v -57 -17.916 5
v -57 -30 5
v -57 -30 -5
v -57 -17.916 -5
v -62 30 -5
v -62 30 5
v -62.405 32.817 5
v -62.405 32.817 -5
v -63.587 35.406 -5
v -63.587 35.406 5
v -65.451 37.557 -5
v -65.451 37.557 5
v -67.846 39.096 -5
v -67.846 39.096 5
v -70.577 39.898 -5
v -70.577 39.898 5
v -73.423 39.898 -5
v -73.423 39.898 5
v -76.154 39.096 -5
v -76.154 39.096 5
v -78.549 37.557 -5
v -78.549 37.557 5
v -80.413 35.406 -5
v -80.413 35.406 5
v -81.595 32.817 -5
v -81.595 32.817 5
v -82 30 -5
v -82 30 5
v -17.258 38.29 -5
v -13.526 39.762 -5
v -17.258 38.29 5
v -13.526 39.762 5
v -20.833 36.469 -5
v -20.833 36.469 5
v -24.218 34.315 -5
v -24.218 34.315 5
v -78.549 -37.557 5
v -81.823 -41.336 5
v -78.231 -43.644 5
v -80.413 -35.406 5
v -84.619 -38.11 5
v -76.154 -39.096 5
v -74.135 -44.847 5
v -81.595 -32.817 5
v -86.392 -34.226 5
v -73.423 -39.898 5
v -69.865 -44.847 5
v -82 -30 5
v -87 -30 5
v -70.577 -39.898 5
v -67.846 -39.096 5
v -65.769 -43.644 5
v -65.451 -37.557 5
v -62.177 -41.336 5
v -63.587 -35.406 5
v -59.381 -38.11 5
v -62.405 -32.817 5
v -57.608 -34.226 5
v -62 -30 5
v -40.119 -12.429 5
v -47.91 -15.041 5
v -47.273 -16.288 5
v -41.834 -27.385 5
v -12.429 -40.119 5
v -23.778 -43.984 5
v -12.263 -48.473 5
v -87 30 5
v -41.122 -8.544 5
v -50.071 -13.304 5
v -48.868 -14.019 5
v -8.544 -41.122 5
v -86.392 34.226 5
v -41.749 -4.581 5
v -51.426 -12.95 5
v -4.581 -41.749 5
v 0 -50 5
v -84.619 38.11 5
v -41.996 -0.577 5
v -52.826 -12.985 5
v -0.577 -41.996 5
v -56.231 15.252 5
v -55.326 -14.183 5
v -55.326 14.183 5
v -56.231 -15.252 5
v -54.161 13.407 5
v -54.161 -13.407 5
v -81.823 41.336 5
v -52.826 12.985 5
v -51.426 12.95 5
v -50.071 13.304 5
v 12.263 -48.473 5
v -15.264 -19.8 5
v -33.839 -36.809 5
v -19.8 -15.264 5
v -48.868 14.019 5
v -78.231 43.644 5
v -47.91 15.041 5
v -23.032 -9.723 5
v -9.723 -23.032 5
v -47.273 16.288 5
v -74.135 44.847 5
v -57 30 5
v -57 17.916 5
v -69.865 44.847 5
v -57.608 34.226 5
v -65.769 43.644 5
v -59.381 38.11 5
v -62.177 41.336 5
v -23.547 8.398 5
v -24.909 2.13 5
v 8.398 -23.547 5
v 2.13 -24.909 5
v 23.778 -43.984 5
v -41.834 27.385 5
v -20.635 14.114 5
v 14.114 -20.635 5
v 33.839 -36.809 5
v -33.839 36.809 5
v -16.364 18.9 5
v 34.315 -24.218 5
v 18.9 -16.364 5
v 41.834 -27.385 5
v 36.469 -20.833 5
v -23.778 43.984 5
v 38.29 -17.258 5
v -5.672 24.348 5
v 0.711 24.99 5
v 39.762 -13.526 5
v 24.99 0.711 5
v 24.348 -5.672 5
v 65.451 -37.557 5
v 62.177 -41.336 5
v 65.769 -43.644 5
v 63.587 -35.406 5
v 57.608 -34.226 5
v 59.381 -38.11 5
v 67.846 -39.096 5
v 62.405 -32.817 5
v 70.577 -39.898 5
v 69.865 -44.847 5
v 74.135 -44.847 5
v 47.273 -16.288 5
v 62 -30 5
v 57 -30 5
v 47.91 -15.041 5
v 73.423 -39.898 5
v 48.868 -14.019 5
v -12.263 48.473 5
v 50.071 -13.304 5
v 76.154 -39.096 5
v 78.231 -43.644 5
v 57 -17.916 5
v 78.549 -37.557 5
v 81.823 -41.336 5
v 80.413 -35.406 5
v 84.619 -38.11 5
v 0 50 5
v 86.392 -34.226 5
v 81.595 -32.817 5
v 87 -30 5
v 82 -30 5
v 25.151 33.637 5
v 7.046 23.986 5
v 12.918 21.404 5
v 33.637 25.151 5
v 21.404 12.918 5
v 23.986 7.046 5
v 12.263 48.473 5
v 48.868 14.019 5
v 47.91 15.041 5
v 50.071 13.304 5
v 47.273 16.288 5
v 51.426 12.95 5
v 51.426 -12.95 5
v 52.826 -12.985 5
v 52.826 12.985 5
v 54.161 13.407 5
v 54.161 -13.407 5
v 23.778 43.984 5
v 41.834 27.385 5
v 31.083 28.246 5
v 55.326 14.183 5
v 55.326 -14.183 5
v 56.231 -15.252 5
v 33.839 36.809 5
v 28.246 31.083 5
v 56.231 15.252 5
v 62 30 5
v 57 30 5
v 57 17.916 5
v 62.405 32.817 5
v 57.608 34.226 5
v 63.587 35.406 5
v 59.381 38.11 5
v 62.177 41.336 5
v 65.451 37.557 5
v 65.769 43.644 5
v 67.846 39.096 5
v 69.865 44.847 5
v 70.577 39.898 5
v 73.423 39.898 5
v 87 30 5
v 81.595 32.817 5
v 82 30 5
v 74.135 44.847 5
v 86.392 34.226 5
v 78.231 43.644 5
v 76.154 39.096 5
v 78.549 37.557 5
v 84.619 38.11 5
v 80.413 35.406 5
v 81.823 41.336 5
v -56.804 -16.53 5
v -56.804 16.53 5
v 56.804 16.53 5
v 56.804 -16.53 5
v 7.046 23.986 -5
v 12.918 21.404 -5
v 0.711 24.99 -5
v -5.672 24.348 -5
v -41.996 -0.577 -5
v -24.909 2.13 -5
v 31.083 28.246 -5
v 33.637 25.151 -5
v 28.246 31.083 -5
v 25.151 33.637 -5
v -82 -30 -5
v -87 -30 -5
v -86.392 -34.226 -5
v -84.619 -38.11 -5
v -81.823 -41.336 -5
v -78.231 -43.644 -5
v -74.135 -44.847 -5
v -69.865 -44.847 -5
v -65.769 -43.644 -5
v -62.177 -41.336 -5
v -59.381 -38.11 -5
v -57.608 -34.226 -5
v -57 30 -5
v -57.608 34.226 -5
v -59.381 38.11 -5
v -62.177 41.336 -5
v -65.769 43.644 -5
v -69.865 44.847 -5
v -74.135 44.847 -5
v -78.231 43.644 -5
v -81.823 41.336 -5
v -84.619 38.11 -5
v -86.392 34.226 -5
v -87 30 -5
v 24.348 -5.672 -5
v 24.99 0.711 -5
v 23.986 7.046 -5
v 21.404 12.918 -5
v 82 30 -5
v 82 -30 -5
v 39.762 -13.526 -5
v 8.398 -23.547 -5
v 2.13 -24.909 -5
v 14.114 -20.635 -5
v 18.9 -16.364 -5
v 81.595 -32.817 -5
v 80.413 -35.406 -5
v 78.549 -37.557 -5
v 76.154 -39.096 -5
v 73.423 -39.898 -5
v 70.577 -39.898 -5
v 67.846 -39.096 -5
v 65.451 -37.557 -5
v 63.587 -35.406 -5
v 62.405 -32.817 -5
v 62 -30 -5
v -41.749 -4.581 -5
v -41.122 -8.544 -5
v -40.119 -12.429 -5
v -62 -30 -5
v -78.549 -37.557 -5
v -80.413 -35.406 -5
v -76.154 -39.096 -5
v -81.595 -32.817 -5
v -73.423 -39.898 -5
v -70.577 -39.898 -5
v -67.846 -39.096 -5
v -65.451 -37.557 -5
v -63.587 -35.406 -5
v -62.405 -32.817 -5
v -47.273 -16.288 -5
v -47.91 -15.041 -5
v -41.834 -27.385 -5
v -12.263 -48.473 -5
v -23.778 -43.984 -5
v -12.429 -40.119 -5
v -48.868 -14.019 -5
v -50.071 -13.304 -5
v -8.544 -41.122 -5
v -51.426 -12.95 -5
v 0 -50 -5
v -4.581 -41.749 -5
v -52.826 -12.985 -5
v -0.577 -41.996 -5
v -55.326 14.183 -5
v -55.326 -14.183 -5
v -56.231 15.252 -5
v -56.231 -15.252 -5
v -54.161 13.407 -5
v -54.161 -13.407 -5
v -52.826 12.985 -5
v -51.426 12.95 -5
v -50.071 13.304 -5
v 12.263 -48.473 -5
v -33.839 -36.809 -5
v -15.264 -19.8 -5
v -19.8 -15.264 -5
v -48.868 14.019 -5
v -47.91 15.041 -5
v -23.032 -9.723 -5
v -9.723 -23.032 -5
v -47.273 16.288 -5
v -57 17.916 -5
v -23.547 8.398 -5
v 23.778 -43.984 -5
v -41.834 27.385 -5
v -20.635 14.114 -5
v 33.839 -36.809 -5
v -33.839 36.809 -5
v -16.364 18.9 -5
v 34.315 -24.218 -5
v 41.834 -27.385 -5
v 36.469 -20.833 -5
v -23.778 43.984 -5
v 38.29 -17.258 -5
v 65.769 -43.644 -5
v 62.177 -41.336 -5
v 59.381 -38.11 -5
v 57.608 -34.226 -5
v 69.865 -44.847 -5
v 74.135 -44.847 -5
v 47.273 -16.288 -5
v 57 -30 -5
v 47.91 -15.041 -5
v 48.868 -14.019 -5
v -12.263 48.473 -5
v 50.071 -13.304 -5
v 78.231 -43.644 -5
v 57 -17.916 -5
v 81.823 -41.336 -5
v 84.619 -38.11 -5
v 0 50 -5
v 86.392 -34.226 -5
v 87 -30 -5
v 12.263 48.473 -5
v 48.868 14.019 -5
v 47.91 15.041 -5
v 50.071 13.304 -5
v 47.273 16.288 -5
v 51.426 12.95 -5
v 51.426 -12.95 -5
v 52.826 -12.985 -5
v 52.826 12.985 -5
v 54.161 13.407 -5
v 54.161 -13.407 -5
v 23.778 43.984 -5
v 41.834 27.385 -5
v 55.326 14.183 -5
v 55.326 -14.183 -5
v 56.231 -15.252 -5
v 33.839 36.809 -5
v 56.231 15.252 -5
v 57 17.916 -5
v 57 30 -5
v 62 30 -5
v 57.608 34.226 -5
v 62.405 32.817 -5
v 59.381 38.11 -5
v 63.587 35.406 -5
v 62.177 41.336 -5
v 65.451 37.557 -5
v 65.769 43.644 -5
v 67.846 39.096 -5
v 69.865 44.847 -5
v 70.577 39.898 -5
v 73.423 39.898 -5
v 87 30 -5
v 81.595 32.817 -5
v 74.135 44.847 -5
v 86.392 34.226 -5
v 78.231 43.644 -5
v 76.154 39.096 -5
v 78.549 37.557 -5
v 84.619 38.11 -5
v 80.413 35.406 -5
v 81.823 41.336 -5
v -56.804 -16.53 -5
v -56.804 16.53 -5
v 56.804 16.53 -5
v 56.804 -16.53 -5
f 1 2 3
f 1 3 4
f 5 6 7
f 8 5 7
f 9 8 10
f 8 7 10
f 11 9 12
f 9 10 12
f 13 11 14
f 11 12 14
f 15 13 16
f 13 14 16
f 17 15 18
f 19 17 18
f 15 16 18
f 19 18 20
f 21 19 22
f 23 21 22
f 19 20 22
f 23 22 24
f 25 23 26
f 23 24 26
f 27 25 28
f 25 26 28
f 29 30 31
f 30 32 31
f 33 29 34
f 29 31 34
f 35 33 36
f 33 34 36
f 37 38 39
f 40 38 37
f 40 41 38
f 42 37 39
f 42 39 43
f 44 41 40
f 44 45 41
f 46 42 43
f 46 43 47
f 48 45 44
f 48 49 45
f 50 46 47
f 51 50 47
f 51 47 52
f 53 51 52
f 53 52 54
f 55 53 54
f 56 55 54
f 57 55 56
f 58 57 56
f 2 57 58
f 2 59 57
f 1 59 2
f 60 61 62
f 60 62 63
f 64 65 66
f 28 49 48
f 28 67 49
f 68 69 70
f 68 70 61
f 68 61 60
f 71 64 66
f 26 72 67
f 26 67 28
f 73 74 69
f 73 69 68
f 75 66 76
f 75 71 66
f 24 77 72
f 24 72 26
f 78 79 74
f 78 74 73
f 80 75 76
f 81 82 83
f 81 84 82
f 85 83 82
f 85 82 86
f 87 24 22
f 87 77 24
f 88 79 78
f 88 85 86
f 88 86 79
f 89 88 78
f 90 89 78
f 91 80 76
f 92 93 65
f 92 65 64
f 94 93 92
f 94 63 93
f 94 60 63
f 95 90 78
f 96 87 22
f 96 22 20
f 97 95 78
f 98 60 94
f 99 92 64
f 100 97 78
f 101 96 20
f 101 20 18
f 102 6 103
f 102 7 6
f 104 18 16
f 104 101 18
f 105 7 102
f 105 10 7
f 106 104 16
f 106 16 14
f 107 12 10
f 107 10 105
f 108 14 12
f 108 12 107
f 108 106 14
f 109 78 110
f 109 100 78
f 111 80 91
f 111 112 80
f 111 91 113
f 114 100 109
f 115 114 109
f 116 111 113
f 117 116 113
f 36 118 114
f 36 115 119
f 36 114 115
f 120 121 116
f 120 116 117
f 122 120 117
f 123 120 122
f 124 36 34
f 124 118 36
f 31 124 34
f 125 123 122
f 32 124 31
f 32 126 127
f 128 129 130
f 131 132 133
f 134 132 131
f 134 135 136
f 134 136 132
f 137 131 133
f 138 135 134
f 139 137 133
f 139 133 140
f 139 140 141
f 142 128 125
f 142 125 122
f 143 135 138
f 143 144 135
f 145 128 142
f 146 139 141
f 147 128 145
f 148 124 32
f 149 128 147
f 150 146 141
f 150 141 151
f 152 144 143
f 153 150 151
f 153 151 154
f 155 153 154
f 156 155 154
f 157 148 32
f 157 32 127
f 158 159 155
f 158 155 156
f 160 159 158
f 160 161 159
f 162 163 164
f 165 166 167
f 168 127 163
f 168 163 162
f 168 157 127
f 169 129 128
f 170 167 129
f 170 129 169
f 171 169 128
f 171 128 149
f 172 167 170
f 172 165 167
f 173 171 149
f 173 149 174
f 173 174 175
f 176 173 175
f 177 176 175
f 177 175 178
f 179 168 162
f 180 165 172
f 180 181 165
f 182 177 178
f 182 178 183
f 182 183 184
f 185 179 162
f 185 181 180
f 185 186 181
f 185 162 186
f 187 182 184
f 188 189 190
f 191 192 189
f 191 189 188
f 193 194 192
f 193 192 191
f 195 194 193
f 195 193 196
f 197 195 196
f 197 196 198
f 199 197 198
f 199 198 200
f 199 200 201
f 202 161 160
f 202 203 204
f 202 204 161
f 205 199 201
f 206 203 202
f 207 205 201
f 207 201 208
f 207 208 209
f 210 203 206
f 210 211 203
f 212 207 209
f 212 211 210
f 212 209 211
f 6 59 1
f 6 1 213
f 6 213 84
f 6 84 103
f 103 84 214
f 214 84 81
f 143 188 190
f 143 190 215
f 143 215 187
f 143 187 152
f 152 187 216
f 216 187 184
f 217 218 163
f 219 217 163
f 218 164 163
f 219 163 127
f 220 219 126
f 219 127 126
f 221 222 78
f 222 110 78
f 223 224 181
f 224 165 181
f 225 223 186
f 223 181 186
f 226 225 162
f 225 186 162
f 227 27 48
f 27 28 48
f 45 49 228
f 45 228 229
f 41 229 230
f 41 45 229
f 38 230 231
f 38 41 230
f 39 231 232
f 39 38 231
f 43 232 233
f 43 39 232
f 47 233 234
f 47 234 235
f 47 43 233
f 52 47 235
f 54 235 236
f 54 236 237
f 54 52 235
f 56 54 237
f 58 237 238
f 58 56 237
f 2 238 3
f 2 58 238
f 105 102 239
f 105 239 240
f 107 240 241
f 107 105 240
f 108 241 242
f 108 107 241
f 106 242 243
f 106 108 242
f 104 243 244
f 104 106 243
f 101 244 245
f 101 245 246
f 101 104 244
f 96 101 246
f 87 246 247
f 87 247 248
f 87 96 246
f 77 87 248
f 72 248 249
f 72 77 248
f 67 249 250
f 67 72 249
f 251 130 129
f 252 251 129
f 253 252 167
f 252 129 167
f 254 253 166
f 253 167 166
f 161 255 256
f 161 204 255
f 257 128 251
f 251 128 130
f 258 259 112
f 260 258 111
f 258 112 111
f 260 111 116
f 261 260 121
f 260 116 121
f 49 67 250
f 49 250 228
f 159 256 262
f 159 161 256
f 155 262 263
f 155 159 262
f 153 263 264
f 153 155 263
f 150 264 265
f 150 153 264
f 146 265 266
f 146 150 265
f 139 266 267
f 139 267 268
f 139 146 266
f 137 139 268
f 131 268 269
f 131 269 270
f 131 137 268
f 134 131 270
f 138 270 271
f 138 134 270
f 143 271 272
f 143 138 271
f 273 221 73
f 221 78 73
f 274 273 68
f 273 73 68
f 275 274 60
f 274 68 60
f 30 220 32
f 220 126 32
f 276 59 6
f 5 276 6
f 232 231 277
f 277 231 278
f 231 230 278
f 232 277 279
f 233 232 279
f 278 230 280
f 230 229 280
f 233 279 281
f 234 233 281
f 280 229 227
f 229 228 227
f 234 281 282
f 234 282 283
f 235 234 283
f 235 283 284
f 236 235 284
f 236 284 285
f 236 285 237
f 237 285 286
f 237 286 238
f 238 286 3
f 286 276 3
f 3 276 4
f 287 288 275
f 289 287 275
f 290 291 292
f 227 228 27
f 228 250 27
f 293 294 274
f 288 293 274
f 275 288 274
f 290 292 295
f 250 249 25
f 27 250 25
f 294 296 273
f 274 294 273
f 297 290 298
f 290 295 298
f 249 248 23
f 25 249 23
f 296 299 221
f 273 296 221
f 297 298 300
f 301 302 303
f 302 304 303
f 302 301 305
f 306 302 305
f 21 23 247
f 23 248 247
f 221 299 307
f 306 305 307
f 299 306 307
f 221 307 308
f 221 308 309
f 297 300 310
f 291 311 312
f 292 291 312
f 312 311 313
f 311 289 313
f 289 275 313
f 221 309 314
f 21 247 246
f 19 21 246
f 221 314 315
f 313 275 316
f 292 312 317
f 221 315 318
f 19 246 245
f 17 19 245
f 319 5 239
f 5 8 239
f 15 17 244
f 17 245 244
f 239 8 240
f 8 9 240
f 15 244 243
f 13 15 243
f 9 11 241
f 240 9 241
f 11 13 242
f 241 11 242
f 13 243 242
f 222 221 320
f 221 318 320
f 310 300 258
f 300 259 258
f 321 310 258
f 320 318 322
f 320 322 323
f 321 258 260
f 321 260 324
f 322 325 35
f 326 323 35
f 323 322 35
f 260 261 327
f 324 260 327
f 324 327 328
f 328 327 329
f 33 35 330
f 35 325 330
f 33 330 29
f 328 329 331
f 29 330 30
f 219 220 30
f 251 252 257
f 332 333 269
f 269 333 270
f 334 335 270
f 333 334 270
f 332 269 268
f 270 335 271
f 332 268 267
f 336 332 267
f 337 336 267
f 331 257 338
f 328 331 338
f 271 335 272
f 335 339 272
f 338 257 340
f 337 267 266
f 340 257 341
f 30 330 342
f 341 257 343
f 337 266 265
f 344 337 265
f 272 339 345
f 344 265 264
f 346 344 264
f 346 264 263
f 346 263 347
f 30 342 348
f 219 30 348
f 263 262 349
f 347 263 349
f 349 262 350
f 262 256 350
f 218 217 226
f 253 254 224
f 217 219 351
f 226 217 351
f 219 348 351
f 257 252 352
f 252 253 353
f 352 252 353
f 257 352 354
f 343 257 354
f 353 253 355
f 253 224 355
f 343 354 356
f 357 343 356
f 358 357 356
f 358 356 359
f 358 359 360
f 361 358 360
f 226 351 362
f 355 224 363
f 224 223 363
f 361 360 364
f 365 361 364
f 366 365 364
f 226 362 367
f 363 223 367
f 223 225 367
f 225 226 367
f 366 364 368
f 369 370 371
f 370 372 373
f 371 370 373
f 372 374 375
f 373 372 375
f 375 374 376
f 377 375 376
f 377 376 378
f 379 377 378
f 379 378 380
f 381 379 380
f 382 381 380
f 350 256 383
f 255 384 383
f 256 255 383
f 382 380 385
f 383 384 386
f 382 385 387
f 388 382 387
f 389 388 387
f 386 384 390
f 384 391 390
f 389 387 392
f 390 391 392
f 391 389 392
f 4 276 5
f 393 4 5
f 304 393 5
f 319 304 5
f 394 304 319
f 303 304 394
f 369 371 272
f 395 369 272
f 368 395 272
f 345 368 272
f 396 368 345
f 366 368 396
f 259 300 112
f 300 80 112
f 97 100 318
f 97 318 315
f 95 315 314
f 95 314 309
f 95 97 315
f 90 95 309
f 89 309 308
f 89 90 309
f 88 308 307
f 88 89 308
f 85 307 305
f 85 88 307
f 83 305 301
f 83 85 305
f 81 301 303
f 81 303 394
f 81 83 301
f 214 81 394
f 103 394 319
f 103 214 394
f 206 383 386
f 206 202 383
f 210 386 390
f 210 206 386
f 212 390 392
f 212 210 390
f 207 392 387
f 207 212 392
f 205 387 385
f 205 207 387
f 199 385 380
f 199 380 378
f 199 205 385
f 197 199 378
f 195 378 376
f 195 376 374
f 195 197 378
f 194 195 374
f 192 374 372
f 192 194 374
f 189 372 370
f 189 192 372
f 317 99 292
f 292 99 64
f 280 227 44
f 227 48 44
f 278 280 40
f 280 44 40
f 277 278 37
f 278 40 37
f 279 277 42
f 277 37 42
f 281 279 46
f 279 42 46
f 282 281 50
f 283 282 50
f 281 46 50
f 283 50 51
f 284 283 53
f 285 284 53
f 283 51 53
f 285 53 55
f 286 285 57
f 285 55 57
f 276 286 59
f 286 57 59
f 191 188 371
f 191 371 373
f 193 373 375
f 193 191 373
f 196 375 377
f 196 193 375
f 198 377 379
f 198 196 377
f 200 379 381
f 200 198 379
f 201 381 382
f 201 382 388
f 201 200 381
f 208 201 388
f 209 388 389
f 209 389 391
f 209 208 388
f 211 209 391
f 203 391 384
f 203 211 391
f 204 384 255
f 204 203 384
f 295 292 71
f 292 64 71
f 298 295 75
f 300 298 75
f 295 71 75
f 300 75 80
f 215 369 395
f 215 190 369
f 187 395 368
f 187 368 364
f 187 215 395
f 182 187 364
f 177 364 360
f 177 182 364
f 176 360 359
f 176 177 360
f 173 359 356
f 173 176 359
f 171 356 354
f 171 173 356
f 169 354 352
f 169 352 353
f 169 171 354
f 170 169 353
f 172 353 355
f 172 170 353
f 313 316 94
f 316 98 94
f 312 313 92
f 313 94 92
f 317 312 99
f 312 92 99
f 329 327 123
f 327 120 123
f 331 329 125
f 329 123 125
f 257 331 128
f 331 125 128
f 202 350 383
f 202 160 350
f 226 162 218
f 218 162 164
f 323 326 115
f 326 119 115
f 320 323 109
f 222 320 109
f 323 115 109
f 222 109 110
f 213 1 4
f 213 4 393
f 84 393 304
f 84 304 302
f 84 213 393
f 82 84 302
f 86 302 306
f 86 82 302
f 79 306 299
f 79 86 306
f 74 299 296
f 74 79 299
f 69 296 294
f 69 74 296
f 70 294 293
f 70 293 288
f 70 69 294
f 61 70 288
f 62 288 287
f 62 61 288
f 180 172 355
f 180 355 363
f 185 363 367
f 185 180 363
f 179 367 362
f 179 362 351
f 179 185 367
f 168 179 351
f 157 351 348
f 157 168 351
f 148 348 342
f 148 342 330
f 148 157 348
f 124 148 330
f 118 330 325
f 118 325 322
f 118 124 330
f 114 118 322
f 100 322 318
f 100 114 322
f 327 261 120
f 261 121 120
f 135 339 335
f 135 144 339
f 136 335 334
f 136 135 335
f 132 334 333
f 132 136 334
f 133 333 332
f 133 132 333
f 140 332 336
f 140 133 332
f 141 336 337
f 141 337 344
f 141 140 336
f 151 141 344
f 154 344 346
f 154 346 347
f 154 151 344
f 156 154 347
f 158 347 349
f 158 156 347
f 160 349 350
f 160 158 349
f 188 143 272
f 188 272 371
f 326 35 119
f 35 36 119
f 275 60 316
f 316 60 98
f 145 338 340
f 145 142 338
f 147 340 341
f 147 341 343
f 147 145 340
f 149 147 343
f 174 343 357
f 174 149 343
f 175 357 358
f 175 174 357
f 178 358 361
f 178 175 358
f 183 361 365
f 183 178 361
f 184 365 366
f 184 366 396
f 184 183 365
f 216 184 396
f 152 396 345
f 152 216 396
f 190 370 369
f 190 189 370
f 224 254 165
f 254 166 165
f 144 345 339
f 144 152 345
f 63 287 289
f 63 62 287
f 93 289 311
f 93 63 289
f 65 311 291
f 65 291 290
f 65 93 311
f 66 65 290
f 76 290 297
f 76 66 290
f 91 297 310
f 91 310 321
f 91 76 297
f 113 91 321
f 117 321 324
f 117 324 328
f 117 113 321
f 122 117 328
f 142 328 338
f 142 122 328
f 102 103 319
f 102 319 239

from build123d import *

# Parameters (mm, degrees)
BOSS_EXTRUDE1_DEPTH = 5


with BuildPart() as part:
    # Sketch2 → Boss-Extrude1 (new, symmetric)
    with BuildSketch(Plane.XY):
        with BuildLine():
            ThreePointArc((57, 17.916472867), (52.825722824, 12.985126011), (47.272727273, 16.287702607))
            ThreePointArc((47.272727273, 16.287702607), (0, 50), (-47.272727273, 16.287702607))
            ThreePointArc((-47.272727273, 16.287702607), (-52.825722824, 12.985126011), (-57, 17.916472867))
            Line((-57, 17.916472867), (-57, 30))
            ThreePointArc((-57, 30), (-72, 45), (-87, 30))
            Line((-87, 30), (-87, -30))
            ThreePointArc((-87, -30), (-72, -45), (-57, -30))
            Line((-57, -30), (-57, -17.916472867))
            ThreePointArc((-57, -17.916472867), (-52.825722824, -12.985126011), (-47.272727273, -16.287702607))
            ThreePointArc((-47.272727273, -16.287702607), (0, -50), (47.272727273, -16.287702607))
            ThreePointArc((47.272727273, -16.287702607), (52.825722824, -12.985126011), (57, -17.916472867))
            Line((57, -17.916472867), (57, -30))
            ThreePointArc((57, -30), (72, -45), (87, -30))
            Line((87, -30), (87, 30))
            ThreePointArc((87, 30), (72, 45), (57, 30))
            Line((57, 30), (57, 17.916472867))
        make_face()
        with BuildLine():
            Line((62, -30), (62, 30))
            ThreePointArc((62, 30), (72, 40), (82, 30))
            Line((82, 30), (82, -30))
            ThreePointArc((82, -30), (72, -40), (62, -30))
        make_face(mode=Mode.SUBTRACT)
        with BuildLine():
            ThreePointArc((-62, 30), (-72, 40), (-82, 30))
            Line((-82, 30), (-82, -30))
            ThreePointArc((-82, -30), (-72, -40), (-62, -30))
            Line((-62, -30), (-62, 30))
        make_face(mode=Mode.SUBTRACT)
        with BuildLine():
            ThreePointArc((24.348067415, -5.672002568), (24.692208515, 3.910861626), (21.403642989, 12.918361615))
            Line((21.403642989, 12.918361615), (33.636517601, 25.151236226))
            ThreePointArc((33.636517601, 25.151236226), (29.69848481, 29.69848481), (25.151236226, 33.636517601))
            Line((25.151236226, 33.636517601), (12.918361615, 21.403642989))
            ThreePointArc((12.918361615, 21.403642989), (3.910861626, 24.692208515), (-5.672002568, 24.348067415))
            Line((-5.672002568, 24.348067415), (-13.525991536, 39.762388673))
            ThreePointArc((-13.525991536, 39.762388673), (-19.067600989, 37.422274016), (-24.218069826, 34.314502676))
            Line((-24.218069826, 34.314502676), (-16.364080859, 18.900181419))
            ThreePointArc((-16.364080859, 18.900181419), (-22.275163105, 11.349762493), (-24.90913336, 2.129571608))
            Line((-24.90913336, 2.129571608), (-41.996040101, -0.576728553))
            ThreePointArc((-41.996040101, -0.576728553), (-41.482910305, -6.570247532), (-40.118826521, -12.42898864))
            Line((-40.118826521, -12.42898864), (-23.03191978, -9.722688479))
            ThreePointArc((-23.03191978, -9.722688479), (-17.67766953, -17.67766953), (-9.722688479, -23.03191978))
            Line((-9.722688479, -23.03191978), (-12.42898864, -40.118826521))
            ThreePointArc((-12.42898864, -40.118826521), (-6.570247532, -41.482910305), (-0.576728553, -41.996040101))
            Line((-0.576728553, -41.996040101), (2.129571608, -24.90913336))
            ThreePointArc((2.129571608, -24.90913336), (11.349762493, -22.275163105), (18.900181419, -16.364080859))
            Line((18.900181419, -16.364080859), (34.314502676, -24.218069826))
            ThreePointArc((34.314502676, -24.218069826), (37.422274016, -19.067600989), (39.762388673, -13.525991536))
            Line((39.762388673, -13.525991536), (24.348067415, -5.672002568))
        make_face(mode=Mode.SUBTRACT)
    extrude(amount=BOSS_EXTRUDE1_DEPTH, both=True)


solid = part.part
